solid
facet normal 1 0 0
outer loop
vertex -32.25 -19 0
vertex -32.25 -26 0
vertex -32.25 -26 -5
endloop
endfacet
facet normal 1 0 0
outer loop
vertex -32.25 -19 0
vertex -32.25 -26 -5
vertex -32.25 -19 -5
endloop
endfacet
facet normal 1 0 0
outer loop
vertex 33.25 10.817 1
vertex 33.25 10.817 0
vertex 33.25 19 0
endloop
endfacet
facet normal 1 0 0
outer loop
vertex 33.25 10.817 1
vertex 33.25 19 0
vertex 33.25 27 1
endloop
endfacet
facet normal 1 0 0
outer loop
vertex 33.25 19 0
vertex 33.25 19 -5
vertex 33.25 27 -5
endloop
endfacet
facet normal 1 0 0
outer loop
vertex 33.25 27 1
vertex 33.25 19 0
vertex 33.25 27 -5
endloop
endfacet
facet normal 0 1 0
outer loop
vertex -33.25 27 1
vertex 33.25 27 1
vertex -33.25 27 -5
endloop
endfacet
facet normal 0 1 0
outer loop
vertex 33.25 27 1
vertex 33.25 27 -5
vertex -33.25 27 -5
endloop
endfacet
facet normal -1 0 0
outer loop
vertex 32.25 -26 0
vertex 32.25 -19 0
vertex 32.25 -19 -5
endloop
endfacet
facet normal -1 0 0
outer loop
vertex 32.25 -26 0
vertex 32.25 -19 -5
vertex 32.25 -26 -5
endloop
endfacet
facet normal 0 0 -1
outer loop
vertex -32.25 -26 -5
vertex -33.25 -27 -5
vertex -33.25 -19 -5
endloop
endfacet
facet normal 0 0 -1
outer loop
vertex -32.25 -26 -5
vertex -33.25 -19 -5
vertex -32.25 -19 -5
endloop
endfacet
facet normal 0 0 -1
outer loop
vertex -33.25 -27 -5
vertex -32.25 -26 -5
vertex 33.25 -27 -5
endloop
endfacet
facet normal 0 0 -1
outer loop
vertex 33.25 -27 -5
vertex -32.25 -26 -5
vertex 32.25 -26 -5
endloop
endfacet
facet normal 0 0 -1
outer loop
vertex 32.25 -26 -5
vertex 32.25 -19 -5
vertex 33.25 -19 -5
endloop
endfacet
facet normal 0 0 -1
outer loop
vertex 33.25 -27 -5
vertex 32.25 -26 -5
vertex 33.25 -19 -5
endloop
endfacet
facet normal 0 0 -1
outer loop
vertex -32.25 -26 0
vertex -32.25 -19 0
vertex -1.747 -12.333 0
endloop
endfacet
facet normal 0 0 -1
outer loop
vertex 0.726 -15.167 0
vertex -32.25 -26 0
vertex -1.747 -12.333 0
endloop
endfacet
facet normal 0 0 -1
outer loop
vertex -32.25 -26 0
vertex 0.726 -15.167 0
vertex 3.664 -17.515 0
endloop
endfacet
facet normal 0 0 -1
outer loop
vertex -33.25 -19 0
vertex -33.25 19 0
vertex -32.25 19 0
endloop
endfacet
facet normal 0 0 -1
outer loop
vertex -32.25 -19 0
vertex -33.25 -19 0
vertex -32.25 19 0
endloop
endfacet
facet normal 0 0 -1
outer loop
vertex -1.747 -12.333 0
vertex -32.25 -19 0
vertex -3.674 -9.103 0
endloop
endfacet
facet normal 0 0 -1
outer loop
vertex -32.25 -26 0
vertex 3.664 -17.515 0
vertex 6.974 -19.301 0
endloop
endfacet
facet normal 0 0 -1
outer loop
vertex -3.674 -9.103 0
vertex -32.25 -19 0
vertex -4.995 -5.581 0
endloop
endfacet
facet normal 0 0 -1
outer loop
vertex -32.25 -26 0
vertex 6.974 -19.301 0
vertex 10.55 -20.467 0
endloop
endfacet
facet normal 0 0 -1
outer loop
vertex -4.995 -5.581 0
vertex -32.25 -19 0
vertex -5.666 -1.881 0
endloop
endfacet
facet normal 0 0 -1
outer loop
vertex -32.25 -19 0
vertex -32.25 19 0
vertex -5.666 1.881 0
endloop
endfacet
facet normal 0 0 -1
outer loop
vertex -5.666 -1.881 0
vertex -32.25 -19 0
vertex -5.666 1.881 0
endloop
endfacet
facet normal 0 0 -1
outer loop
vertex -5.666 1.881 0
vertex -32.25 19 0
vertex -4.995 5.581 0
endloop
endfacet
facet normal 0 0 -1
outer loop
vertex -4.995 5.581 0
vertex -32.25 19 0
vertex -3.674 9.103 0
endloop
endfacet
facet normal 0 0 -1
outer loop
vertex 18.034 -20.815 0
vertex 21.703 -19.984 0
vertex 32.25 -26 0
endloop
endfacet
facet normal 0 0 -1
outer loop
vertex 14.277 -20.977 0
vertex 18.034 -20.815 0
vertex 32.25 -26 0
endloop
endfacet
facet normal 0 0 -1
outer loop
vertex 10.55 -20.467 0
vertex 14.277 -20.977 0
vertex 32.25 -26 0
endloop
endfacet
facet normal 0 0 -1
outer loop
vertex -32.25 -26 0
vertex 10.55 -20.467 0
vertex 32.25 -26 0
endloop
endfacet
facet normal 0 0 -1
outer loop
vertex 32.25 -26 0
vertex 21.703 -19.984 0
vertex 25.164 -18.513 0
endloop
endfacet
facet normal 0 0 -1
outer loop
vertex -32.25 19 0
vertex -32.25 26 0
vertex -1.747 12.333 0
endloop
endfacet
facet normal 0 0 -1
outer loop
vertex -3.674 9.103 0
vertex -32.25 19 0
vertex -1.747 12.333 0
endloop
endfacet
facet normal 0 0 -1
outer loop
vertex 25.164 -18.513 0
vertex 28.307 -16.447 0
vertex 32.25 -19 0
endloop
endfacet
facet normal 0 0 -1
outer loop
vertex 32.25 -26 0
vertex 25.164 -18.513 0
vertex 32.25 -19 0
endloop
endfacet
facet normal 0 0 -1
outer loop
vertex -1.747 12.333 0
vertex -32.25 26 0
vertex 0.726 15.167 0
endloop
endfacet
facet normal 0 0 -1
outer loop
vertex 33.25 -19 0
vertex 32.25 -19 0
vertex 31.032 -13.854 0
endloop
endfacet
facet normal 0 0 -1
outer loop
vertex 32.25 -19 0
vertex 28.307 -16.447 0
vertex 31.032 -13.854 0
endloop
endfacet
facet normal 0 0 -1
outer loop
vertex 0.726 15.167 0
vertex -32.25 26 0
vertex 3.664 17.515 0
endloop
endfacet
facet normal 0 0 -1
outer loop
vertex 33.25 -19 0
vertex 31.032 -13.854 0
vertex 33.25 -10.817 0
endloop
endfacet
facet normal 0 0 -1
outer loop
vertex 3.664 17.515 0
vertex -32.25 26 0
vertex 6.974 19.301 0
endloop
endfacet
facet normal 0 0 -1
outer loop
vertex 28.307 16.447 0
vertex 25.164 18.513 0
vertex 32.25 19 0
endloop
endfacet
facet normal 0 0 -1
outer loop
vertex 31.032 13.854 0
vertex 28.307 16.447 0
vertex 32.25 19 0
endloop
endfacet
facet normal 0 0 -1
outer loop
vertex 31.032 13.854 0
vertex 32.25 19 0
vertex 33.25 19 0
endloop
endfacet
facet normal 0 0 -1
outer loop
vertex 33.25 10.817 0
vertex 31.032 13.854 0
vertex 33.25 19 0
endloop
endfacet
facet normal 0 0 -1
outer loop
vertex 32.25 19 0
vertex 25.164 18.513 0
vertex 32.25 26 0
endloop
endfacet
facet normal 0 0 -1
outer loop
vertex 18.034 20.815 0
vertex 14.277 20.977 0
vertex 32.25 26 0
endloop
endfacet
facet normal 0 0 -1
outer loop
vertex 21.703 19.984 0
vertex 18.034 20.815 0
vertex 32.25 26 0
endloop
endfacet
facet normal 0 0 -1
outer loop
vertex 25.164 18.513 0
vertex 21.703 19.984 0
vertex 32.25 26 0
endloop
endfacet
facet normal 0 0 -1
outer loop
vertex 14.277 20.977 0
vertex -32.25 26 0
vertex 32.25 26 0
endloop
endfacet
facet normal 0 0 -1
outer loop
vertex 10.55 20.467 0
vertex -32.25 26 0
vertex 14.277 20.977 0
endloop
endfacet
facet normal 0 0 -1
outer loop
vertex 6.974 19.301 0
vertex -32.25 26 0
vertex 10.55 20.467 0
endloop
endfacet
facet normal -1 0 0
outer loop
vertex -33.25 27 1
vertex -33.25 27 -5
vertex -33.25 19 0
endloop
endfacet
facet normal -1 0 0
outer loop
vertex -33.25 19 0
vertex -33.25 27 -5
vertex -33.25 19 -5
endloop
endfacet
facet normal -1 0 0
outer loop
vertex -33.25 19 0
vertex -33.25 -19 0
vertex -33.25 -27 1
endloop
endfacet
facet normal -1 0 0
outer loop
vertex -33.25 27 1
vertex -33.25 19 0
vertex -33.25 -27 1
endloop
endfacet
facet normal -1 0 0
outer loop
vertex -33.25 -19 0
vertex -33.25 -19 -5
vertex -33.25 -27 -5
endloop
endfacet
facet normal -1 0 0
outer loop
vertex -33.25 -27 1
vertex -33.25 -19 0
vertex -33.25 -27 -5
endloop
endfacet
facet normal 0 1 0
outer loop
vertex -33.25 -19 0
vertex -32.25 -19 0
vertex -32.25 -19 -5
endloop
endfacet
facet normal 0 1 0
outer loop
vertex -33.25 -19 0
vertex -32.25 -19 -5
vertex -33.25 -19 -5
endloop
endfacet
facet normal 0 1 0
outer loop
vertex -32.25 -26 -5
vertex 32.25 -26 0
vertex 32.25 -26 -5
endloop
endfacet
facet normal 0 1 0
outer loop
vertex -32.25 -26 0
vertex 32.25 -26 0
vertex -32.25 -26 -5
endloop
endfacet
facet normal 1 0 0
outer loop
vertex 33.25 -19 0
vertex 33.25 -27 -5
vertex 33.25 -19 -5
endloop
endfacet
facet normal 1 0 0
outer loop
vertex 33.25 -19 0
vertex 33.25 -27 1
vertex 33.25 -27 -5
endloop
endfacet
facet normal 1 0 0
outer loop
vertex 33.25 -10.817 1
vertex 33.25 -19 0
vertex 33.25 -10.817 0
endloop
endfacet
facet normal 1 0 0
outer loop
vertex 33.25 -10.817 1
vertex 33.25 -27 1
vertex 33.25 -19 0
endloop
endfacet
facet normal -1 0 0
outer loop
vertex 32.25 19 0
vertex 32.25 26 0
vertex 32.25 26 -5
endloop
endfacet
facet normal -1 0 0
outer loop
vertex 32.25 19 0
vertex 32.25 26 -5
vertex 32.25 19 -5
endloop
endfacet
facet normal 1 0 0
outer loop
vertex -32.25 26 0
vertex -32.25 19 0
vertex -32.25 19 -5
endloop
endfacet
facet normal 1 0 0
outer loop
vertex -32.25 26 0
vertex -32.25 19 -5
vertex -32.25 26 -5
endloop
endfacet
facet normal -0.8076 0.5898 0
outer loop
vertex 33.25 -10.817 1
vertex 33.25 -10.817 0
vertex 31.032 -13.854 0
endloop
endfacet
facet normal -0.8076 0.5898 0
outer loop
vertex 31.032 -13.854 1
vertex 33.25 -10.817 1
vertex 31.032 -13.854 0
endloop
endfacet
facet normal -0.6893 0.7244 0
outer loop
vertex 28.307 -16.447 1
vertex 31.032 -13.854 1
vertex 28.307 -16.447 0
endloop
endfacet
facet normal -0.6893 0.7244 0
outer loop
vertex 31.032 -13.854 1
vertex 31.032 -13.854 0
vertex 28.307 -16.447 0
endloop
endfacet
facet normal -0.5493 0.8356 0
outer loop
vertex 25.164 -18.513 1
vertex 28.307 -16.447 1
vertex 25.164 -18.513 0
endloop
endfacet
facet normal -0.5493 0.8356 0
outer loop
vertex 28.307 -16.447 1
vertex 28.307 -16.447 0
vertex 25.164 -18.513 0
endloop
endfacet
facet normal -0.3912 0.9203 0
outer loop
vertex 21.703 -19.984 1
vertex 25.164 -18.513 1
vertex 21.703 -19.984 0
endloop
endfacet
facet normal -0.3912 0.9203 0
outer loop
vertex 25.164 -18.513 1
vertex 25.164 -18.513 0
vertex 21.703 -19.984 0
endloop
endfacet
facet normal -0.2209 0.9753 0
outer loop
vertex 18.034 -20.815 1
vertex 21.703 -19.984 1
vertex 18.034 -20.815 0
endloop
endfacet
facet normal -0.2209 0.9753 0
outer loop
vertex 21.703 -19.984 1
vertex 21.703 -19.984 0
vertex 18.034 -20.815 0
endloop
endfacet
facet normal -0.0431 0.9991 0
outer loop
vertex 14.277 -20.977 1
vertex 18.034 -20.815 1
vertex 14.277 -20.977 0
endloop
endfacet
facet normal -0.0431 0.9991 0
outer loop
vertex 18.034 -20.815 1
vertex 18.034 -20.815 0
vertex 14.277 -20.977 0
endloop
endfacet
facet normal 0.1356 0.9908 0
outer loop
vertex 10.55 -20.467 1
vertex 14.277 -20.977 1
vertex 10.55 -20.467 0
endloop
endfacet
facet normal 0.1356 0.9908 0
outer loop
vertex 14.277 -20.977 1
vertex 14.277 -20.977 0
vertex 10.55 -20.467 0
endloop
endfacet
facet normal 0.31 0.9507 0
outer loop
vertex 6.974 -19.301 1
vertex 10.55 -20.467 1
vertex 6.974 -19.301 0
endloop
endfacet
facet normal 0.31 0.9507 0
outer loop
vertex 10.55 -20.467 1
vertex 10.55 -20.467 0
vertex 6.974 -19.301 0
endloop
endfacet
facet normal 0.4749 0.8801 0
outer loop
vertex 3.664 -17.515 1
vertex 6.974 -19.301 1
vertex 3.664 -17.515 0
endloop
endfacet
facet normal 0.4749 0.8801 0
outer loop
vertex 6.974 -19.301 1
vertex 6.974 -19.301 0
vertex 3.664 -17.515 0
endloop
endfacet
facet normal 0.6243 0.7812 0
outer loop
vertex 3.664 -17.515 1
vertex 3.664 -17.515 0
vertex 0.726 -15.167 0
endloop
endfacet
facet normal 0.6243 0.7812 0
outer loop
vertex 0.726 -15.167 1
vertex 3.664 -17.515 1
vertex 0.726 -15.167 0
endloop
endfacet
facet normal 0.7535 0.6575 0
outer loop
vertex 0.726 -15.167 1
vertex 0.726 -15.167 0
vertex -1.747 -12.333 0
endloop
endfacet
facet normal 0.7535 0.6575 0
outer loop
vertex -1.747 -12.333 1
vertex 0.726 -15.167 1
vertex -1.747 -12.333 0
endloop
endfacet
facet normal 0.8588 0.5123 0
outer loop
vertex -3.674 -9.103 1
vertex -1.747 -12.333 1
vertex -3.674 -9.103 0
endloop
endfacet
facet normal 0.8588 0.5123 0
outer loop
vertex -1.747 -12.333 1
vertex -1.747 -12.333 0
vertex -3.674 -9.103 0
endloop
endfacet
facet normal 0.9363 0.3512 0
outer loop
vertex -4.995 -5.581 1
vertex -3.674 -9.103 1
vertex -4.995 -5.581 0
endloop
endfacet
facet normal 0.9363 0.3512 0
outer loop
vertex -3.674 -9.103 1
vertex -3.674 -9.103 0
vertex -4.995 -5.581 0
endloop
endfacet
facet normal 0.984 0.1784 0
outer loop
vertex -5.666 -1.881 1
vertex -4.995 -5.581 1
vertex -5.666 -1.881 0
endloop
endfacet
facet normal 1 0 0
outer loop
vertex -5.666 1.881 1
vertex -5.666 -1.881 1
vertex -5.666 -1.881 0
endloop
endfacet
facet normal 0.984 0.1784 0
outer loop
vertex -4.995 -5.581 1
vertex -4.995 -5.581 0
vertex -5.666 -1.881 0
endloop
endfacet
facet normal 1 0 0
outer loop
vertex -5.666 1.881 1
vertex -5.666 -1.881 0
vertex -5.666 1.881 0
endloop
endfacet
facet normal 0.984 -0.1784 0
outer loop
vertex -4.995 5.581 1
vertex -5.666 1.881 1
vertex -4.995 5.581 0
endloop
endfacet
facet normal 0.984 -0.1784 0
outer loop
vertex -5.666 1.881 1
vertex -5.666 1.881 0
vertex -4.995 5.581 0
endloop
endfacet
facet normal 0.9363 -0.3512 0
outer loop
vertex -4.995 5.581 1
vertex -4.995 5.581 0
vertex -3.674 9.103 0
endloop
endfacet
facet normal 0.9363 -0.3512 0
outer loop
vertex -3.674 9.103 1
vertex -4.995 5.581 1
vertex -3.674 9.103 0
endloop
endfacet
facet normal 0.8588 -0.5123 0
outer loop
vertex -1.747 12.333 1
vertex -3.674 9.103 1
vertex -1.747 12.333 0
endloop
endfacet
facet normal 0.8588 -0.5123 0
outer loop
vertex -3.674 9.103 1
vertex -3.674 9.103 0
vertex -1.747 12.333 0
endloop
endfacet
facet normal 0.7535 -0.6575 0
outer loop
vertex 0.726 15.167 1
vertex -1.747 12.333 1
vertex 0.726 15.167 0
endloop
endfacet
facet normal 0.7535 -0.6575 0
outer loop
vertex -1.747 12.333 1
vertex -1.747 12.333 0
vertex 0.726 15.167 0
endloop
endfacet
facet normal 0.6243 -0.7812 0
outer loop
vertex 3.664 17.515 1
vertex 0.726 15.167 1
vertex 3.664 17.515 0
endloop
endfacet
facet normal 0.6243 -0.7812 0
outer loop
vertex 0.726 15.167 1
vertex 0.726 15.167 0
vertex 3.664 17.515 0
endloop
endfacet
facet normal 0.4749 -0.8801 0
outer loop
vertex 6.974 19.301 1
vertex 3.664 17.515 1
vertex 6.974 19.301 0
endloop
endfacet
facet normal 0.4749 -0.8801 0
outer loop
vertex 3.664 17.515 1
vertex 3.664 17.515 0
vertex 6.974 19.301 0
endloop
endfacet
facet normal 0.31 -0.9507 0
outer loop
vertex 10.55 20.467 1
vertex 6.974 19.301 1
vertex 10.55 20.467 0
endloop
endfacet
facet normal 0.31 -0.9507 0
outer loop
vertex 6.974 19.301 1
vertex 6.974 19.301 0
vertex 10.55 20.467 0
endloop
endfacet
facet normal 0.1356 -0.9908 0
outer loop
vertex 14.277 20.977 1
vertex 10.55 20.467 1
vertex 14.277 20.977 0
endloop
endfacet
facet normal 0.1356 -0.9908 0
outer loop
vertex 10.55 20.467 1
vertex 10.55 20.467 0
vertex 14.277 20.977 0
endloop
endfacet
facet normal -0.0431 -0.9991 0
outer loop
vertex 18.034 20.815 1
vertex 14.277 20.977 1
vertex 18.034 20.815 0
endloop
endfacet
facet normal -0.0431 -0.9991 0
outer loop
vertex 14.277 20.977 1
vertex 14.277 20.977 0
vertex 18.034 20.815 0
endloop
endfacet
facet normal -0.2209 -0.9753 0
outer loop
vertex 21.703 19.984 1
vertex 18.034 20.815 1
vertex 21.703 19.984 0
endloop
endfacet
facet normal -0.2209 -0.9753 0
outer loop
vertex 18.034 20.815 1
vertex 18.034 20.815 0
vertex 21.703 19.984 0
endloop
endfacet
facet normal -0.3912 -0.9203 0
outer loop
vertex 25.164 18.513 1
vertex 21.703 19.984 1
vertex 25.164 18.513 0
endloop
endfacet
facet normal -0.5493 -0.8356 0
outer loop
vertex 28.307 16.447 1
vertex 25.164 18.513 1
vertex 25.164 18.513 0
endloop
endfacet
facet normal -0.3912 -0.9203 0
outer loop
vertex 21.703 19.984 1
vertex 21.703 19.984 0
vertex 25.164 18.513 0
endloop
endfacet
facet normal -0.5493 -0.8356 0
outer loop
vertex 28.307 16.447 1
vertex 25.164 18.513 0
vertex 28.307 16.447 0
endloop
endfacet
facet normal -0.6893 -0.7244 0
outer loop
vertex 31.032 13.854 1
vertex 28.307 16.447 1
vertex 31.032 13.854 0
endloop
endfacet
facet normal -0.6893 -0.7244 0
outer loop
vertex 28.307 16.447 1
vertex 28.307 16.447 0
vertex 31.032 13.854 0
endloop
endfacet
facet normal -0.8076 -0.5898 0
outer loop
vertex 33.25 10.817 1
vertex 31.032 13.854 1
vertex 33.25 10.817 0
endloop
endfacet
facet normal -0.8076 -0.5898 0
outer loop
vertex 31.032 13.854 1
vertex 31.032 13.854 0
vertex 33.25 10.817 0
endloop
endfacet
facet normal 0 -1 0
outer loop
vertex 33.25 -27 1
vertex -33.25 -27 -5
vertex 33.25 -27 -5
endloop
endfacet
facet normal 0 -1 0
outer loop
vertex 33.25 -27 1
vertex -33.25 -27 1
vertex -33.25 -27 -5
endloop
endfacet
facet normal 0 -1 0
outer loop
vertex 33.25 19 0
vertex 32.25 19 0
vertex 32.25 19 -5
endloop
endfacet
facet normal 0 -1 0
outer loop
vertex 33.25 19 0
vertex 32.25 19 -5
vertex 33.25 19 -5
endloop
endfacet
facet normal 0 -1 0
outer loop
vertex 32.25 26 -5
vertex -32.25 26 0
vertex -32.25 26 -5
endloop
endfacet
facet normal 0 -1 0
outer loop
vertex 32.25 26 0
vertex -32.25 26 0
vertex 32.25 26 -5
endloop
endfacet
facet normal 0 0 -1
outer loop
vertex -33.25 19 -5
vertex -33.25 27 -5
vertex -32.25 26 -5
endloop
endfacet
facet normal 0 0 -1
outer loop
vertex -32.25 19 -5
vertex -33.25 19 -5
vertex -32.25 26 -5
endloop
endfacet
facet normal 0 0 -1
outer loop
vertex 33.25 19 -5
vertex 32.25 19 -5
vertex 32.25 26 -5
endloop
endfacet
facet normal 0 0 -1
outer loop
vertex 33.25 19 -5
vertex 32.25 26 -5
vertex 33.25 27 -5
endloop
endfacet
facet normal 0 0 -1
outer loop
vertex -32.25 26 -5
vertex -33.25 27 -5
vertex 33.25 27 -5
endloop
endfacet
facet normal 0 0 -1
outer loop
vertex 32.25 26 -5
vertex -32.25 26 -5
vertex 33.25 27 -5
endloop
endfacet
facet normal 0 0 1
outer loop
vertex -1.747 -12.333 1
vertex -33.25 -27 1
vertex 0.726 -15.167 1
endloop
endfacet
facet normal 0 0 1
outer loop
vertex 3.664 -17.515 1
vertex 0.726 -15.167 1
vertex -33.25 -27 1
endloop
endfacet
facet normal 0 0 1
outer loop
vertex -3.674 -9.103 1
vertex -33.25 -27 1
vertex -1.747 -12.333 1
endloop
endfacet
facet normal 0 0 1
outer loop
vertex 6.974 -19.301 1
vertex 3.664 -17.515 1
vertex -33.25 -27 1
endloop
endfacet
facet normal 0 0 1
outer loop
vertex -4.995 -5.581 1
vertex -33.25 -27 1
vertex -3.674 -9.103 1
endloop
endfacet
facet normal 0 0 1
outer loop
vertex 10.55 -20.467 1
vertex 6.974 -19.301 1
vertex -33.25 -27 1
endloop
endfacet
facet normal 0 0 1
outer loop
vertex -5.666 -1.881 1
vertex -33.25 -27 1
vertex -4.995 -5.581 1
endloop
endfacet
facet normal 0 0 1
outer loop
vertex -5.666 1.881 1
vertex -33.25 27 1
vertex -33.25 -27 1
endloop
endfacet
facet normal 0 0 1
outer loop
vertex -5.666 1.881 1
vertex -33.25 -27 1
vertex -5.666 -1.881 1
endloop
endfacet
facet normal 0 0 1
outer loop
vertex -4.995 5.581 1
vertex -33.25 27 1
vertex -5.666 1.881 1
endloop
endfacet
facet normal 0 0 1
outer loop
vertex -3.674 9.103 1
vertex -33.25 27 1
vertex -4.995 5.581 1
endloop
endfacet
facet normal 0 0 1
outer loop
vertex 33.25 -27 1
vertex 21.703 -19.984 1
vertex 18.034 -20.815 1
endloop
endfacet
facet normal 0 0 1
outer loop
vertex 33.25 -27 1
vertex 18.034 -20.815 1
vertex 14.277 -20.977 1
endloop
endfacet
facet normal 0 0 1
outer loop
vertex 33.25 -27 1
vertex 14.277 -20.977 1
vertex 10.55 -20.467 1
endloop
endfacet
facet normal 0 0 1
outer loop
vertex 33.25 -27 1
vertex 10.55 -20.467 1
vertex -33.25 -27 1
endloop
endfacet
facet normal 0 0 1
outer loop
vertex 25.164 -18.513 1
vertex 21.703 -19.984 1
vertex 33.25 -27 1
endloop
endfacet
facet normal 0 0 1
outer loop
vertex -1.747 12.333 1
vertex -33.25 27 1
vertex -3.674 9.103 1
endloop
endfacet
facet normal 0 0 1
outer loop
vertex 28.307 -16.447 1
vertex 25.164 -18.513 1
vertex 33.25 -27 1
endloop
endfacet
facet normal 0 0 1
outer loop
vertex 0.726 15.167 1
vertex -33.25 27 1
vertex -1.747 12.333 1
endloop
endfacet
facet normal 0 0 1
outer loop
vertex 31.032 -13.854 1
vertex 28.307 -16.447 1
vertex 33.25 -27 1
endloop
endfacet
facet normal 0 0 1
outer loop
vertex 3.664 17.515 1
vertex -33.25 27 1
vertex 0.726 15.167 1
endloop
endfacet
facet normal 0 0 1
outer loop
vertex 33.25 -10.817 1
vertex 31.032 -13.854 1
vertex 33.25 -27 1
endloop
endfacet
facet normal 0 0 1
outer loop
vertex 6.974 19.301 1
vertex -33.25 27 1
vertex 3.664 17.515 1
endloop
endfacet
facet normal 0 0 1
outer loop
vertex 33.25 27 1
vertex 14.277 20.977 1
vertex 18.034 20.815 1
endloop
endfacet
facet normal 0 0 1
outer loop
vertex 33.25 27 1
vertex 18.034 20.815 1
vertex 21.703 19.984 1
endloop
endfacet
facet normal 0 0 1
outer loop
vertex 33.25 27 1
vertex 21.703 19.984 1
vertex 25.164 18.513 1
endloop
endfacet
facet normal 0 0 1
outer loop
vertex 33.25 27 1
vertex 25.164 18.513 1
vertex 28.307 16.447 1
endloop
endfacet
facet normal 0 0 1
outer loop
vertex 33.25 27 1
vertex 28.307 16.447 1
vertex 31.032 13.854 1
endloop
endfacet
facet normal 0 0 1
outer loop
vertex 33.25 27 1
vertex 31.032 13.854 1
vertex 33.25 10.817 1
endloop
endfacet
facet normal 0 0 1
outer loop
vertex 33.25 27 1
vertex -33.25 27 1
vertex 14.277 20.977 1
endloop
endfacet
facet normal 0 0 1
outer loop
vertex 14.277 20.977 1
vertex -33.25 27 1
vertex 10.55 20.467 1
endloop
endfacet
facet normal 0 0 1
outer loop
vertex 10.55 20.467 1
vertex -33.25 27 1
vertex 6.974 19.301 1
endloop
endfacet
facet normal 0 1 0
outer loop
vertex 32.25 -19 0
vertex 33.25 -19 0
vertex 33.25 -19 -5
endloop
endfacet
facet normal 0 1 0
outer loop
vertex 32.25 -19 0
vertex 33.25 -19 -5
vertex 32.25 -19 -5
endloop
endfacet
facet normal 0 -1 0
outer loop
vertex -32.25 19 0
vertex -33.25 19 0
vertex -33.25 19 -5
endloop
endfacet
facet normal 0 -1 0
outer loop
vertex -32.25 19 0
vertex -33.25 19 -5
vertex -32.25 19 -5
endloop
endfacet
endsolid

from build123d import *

# Parameters (mm, degrees)
BOSS_EXTRUDE1_DEPTH = 1
BOSS_EXTRUDE2_START = -1
BOSS_EXTRUDE2_DEPTH = 5


with BuildPart() as part:
    # Sketch1 → Boss-Extrude1 (new body)
    with BuildSketch(Plane.XY):
        with BuildLine():
            Line((33.25, 27), (-33.25, 27))
            Line((-33.25, 27), (-33.25, -27))
            Line((-33.25, -27), (33.25, -27))
            Line((33.25, -27), (33.25, -10.816653826))
            ThreePointArc((33.25, -10.816653826), (-5.75, 0), (33.25, 10.816653826))
            Line((33.25, 10.816653826), (33.25, 27))
        make_face()
    extrude(amount=BOSS_EXTRUDE1_DEPTH)

    # Sketch2 → Boss-Extrude2 (add)
    with BuildSketch(Plane.XY.offset(1).offset(BOSS_EXTRUDE2_START)):
        Polygon((33.25, -19), (32.25, -19), (32.25, -26), (-32.25, -26), (-32.25, -19), (-33.25, -19), (-33.25, -27), (33.25, -27), align=None)
        Polygon((33.25, 27), (-33.25, 27), (-33.25, 19), (-32.25, 19), (-32.25, 26), (32.25, 26), (32.25, 19), (33.25, 19), align=None)
    extrude(amount=-BOSS_EXTRUDE2_DEPTH)


solid = part.part
